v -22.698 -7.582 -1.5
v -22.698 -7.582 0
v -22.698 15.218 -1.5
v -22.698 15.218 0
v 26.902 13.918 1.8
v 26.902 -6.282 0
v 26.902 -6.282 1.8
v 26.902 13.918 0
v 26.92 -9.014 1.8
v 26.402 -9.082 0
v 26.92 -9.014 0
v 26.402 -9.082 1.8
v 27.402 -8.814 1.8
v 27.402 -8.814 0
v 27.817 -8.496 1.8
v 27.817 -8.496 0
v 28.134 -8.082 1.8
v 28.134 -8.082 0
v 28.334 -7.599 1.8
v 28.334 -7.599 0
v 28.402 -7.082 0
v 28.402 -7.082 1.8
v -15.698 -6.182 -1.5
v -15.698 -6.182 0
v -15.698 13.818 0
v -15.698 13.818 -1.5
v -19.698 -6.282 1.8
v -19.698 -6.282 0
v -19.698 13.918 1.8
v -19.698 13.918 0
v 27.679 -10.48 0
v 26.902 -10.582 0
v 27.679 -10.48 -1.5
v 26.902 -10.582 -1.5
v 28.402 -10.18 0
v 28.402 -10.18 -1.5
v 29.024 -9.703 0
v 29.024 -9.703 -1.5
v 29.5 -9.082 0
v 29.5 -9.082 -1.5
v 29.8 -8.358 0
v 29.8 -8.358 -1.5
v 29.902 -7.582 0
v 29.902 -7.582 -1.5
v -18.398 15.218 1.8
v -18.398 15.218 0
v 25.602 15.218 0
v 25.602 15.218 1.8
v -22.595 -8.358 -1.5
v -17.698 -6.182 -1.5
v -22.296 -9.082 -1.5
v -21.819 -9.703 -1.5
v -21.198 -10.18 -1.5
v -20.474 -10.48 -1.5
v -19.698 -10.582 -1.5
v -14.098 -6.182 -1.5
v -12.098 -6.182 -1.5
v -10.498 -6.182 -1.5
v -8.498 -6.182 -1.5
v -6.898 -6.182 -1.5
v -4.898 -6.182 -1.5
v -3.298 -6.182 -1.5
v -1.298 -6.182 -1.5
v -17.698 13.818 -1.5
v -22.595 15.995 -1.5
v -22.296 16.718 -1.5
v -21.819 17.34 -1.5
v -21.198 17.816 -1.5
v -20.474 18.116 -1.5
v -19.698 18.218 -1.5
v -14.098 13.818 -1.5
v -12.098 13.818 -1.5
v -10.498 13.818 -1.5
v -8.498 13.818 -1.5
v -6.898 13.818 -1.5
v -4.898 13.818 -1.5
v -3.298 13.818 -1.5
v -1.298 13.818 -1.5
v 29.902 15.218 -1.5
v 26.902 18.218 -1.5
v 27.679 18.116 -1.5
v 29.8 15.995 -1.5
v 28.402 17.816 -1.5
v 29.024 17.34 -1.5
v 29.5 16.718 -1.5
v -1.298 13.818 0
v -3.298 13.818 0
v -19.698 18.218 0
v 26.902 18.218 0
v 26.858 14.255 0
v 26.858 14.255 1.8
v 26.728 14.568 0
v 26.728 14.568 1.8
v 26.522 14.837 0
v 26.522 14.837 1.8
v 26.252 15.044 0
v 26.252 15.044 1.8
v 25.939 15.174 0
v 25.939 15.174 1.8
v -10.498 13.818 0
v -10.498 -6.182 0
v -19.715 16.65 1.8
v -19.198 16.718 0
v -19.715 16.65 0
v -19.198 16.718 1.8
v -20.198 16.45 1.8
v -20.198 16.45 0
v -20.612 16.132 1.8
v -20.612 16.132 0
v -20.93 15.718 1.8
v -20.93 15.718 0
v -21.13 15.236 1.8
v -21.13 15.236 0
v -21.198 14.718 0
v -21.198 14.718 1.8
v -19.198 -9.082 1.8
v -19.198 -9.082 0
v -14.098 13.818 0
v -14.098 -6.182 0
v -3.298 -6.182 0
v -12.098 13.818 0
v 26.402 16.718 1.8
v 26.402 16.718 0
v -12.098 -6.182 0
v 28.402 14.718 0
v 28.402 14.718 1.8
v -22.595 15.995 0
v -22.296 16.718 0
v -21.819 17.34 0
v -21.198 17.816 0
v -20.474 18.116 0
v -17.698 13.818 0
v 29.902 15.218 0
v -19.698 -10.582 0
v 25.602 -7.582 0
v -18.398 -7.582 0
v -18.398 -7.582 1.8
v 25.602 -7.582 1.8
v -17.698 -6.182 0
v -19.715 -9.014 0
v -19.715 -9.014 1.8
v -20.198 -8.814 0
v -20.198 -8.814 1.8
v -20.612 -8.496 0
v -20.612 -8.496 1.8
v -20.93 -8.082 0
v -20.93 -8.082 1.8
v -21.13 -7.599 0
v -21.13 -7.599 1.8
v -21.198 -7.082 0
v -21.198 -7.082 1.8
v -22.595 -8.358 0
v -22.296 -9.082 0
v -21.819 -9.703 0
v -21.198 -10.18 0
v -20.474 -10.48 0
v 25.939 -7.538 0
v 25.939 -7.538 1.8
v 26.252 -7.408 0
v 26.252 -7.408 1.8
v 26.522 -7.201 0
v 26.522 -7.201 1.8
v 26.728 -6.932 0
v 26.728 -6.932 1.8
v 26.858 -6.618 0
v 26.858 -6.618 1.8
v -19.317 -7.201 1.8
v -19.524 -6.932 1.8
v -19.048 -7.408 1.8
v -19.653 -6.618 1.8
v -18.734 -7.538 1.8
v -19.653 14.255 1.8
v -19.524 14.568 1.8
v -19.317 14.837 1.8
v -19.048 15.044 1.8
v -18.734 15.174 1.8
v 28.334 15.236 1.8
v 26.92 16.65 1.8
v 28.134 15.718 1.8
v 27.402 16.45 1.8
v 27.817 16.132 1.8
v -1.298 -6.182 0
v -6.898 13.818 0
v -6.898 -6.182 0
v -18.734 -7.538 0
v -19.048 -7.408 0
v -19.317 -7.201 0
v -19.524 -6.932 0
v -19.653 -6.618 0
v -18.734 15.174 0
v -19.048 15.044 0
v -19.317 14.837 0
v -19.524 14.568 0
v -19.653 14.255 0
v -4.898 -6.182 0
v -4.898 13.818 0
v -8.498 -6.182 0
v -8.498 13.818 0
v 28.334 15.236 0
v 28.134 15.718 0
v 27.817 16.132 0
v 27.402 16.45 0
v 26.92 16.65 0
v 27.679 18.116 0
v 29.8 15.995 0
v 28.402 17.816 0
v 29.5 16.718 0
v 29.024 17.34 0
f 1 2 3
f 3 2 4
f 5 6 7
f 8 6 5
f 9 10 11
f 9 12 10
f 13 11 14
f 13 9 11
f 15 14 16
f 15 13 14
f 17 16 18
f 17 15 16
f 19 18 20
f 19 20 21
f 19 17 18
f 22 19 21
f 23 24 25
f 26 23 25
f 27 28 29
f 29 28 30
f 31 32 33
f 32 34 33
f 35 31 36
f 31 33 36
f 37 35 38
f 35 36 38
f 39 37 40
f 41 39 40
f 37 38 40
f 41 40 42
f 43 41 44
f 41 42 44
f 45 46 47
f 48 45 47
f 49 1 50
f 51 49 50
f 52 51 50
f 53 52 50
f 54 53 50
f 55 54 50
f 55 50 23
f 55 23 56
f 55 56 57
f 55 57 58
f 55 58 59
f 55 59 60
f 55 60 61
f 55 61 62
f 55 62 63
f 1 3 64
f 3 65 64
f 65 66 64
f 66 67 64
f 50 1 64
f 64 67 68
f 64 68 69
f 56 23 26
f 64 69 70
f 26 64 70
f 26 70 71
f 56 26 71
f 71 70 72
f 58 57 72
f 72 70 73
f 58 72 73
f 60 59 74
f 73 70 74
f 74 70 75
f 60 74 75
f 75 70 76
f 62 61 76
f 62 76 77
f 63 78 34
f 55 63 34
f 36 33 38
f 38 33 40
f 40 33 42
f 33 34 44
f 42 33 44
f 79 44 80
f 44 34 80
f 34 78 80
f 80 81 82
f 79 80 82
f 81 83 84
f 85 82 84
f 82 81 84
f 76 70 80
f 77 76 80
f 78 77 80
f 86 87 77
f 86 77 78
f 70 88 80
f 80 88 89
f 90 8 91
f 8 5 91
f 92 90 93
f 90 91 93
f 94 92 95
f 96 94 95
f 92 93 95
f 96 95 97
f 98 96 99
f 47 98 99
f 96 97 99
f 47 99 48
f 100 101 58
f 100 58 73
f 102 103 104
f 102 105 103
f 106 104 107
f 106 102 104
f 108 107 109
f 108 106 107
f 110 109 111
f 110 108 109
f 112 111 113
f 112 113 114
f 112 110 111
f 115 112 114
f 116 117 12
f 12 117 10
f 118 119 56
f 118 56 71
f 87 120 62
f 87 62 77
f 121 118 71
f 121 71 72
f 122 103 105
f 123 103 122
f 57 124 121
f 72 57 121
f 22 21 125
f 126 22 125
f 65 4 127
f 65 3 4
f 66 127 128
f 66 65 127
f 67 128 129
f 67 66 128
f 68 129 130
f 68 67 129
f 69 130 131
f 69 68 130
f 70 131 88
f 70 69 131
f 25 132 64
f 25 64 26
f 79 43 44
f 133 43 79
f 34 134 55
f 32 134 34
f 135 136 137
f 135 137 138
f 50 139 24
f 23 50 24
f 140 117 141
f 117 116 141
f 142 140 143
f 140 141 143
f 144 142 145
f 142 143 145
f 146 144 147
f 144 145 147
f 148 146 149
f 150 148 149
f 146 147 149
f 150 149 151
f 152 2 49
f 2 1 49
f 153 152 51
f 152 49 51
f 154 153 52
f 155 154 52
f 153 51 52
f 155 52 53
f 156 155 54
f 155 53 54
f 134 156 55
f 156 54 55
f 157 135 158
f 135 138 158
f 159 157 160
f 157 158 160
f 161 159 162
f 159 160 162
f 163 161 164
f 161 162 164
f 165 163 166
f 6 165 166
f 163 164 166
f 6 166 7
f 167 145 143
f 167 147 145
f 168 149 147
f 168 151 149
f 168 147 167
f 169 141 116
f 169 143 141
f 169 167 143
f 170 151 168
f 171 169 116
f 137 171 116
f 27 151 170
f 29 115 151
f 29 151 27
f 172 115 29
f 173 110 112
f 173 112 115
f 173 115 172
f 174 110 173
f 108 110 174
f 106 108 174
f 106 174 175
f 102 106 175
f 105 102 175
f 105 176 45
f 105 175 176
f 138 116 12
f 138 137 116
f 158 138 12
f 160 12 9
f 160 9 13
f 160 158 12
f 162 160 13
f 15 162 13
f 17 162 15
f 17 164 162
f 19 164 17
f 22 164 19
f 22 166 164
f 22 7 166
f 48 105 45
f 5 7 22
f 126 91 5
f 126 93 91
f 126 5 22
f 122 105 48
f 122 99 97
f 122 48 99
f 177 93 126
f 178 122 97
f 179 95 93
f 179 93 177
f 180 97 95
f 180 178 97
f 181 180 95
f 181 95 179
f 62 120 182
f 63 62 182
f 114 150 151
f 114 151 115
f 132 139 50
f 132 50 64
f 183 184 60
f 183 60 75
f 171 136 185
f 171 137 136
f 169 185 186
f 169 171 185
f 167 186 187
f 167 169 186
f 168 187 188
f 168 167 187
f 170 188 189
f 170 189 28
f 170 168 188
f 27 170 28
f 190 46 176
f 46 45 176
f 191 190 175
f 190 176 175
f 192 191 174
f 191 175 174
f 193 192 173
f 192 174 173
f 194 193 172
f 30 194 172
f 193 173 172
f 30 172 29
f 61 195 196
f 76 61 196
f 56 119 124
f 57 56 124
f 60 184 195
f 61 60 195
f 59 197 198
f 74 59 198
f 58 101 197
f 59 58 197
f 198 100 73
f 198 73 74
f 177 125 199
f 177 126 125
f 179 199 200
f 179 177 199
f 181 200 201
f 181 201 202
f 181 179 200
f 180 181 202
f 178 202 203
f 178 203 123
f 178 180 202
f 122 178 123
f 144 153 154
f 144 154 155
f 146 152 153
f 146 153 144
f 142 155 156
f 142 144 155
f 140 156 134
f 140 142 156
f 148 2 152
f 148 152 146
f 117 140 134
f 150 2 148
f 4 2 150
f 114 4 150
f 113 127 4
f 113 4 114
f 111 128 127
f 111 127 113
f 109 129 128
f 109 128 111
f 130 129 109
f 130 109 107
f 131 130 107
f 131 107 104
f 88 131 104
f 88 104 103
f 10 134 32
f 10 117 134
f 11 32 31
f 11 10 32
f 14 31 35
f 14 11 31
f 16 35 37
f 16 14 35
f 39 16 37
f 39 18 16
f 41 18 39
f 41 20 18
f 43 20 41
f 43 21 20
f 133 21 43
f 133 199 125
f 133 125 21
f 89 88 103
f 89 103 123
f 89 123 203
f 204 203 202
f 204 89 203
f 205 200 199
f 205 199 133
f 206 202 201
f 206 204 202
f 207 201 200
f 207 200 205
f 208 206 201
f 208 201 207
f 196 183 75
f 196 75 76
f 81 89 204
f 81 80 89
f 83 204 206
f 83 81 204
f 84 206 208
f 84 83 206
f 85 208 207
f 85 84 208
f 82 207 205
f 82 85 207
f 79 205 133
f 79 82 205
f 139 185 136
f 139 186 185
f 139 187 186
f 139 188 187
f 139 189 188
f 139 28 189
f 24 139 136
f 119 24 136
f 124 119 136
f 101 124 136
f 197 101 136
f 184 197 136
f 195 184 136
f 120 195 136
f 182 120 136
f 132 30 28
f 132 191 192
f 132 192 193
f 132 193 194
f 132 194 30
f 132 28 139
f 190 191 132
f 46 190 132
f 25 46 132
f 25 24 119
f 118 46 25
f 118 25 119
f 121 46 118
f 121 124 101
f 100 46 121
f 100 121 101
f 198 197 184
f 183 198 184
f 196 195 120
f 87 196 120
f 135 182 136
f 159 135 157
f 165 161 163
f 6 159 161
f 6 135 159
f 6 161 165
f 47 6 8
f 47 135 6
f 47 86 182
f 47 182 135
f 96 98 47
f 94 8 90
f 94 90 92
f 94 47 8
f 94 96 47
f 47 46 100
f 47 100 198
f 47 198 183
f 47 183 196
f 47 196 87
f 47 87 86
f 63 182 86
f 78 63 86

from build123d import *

# Parameters (mm, degrees)
F0_W     = 52.6
F0_H     = 28.8
F0_W_2   = 49.6
F0_H_2   = 25.8
F0_W_3   = 46.6
F0_H_3   = 22.8
F0_W_4   = 2
F0_H_4   = 20
F1_DEPTH = 1.5
F2_R     = 3
F3_DEPTH = 1.8
F4_R     = 2
F5_R     = 1.3


with BuildPart() as f1:
    # F0 (on Top) → F1 (new body)
    with BuildSketch(Plane.XY):
        with Locations((3.602296, 3.818181)):
            Rectangle(F0_W, F0_H)
        with Locations((3.602296, 3.818181)):
            Rectangle(F0_W_2, F0_H_2, mode=Mode.SUBTRACT)
        with Locations((3.602296, 3.818181)):
            Rectangle(F0_W_2, F0_H_2)
        with Locations((3.602296, 3.818181)):
            Rectangle(F0_W_3, F0_H_3, mode=Mode.SUBTRACT)
        with Locations((3.602296, 3.818181)):
            Rectangle(F0_W_3, F0_H_3)
        with Locations((-16.697704, 3.818181)):
            Rectangle(F0_W_4, F0_H_4, mode=Mode.SUBTRACT)
        with Locations((-13.097704, 3.818181)):
            Rectangle(F0_W_4, F0_H_4, mode=Mode.SUBTRACT)
        with Locations((-9.497704, 3.818181)):
            Rectangle(F0_W_4, F0_H_4, mode=Mode.SUBTRACT)
        with Locations((-5.897704, 3.818181)):
            Rectangle(F0_W_4, F0_H_4, mode=Mode.SUBTRACT)
        with Locations((-2.297704, 3.818181)):
            Rectangle(F0_W_4, F0_H_4, mode=Mode.SUBTRACT)
    extrude(amount=-F1_DEPTH)

    # F2
    f2_edges = [f1.edges().sort_by_distance(p)[0] for p in [
        (-22.697704, 18.218181, -0.75),
        (29.902296, 18.218181, -0.75),
        (29.902296, -10.581819, -0.75),
        (-22.697704, -10.581819, -0.75),
    ]]
    fillet(f2_edges, radius=F2_R)

    # F0 (on Top) → F3 (join)
    with BuildSketch(Plane.XY):
        with Locations((3.602296, 3.818181)):
            Rectangle(F0_W_2, F0_H_2)
        with Locations((3.602296, 3.818181)):
            Rectangle(F0_W_3, F0_H_3, mode=Mode.SUBTRACT)
    extrude(amount=F3_DEPTH)

    # F4
    f4_edges = [f1.edges().sort_by_distance(p)[0] for p in [
        (-21.197704, -9.081819, 0.9),
        (-21.197704, 16.718181, 0.9),
        (28.402296, 16.718181, 0.9),
        (28.402296, -9.081819, 0.9),
    ]]
    fillet(f4_edges, radius=F4_R)

    # F5
    f5_edges = [f1.edges().sort_by_distance(p)[0] for p in [
        (-19.697704, 15.218181, 0.9),
        (-19.697704, -7.581819, 0.9),
        (26.902296, -7.581819, 0.9),
        (26.902296, 15.218181, 0.9),
    ]]
    fillet(f5_edges, radius=F5_R)


solid = f1.part
